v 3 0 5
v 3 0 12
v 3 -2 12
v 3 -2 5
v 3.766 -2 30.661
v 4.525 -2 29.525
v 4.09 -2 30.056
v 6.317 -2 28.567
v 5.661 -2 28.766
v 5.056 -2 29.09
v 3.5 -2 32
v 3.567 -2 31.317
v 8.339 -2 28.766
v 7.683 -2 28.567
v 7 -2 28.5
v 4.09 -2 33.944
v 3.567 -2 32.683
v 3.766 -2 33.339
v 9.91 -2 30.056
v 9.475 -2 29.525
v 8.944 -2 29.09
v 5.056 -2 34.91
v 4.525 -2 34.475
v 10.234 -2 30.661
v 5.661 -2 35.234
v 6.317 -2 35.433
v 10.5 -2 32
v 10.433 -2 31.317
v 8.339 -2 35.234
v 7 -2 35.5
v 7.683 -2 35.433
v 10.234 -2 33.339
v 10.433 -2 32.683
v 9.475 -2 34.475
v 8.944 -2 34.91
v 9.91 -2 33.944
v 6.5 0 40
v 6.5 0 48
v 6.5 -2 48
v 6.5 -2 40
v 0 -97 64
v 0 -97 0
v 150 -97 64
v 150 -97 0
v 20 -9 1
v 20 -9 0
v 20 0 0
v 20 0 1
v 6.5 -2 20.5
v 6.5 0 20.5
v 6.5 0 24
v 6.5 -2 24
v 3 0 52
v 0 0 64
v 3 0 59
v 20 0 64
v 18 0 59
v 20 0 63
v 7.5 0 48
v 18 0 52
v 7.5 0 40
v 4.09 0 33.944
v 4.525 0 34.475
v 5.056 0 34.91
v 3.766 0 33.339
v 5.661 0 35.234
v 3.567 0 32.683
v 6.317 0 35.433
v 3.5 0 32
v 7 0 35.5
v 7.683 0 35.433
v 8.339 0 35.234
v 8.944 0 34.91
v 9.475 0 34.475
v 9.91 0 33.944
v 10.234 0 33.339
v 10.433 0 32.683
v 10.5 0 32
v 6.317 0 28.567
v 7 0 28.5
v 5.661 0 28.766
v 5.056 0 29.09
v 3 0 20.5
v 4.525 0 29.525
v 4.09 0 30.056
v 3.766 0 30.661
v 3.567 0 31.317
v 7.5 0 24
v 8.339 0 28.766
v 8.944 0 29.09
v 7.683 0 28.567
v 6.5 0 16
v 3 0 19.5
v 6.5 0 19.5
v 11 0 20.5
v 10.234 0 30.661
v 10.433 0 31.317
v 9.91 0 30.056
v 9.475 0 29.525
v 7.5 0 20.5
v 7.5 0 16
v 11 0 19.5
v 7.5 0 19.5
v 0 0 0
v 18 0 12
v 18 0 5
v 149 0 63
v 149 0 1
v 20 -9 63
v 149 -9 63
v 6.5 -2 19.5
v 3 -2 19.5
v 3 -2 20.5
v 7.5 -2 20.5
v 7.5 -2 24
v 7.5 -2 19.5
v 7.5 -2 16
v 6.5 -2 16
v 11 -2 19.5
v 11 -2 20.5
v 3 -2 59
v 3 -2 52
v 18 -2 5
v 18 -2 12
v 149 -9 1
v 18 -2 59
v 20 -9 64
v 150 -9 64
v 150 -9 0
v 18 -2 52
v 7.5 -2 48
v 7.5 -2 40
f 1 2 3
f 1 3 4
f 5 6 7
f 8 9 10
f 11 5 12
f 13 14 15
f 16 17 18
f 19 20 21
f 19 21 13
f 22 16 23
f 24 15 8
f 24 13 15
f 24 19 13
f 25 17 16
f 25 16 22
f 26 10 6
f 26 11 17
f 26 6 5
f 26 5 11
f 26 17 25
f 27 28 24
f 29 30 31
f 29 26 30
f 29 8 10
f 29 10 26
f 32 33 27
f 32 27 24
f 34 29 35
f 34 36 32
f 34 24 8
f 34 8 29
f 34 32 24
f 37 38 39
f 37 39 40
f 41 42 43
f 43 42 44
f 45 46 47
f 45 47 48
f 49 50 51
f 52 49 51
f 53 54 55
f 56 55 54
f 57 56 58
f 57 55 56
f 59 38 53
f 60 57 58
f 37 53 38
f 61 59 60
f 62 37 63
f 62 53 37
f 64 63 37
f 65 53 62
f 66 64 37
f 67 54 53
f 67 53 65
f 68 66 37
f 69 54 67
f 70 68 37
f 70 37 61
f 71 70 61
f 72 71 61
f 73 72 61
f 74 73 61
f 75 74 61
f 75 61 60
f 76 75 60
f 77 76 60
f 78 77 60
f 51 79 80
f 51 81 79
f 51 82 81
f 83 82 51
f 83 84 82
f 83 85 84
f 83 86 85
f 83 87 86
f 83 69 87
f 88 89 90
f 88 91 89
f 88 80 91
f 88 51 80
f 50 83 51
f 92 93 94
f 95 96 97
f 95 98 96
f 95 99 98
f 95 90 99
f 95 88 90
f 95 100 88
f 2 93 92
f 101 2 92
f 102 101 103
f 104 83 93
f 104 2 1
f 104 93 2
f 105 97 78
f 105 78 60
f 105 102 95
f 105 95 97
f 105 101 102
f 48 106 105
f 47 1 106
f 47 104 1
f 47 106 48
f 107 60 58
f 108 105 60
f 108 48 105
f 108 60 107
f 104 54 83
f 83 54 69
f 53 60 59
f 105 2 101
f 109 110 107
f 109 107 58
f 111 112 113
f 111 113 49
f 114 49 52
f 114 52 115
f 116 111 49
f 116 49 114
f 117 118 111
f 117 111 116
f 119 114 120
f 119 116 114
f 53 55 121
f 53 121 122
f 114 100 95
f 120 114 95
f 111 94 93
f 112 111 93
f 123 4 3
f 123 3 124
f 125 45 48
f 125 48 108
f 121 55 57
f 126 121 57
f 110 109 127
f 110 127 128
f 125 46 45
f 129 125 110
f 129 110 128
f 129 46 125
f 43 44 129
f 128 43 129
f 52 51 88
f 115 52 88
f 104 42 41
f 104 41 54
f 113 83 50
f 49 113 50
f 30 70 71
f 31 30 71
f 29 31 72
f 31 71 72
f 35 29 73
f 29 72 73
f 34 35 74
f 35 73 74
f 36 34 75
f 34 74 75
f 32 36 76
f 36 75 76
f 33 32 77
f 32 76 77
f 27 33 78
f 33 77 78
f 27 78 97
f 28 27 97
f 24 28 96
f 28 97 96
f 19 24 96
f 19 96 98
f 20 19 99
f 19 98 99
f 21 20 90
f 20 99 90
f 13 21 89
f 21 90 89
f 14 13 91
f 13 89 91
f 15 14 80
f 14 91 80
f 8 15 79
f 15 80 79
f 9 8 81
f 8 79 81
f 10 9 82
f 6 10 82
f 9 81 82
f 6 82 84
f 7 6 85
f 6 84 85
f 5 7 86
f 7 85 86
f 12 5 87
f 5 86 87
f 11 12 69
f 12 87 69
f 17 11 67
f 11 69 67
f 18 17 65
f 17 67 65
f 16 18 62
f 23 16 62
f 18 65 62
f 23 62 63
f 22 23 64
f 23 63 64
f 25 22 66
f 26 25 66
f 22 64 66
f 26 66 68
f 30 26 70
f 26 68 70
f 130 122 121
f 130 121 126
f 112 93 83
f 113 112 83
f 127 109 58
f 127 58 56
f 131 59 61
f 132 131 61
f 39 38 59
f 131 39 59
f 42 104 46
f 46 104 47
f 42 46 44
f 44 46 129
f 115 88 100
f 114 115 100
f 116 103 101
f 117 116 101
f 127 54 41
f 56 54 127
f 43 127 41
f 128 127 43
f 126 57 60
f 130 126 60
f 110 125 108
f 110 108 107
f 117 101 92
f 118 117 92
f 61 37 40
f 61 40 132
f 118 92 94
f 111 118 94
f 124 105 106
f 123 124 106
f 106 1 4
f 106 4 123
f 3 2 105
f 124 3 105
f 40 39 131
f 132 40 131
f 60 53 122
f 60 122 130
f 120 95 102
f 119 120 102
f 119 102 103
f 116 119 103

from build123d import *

# Parameters (mm, degrees)
SKETCH1_W               = 150
SKETCH1_H               = 97
BOSS_EXTRUDE2_DEPTH     = 64
CUT_EXTRUDE1_DEPTH      = 190.74983531
CUT_EXTRUDE1_DEPTH_BACK = 9
SKETCH4_R               = 3.5
SKETCH4_W               = 15
SKETCH4_H               = 7
SKETCH4_W_2             = 1
SKETCH4_H_2             = 8
CUT_EXTRUDE2_DEPTH      = 2


with BuildPart() as part:
    # Sketch1 → Boss-Extrude2 (new body)
    with BuildSketch(Plane.XY):
        with Locations((75, -48.5)):
            Rectangle(SKETCH1_W, SKETCH1_H)
    extrude(amount=BOSS_EXTRUDE2_DEPTH)

    # Sketch3 → Cut-Extrude1 (cut, two sides: drawn at the far end of the back side and taken through both)
    with BuildSketch(Plane(origin=(0, 0, 0), x_dir=(1, 0, 0), z_dir=(0, 1, 0)).offset(-CUT_EXTRUDE1_DEPTH_BACK)):
        Polygon((20, 299.799930987), (20, 0), (20, -1), (149, -1), (149, -63), (20, -63), (20, -64), (20, -363.799930987), (619.599861974, -363.799930987), (619.599861974, 299.799930987), align=None)
    extrude(amount=CUT_EXTRUDE1_DEPTH + CUT_EXTRUDE1_DEPTH_BACK, mode=Mode.SUBTRACT)

    # Sketch4 → Cut-Extrude2 (cut)
    with BuildSketch(Plane(origin=(0, 0, 0), x_dir=(1, 0, 0), z_dir=(0, 1, 0))):
        with Locations(Location((7, -32, 0), (0, 0, 270))):
            Circle(SKETCH4_R)
        with Locations((10.5, -8.5)):
            Rectangle(SKETCH4_W, SKETCH4_H)
        with Locations((10.5, -55.5)):
            Rectangle(SKETCH4_W, SKETCH4_H)
        Polygon((6.5, -16), (6.5, -19.5), (3, -19.5), (3, -20.5), (6.5, -20.5), (6.5, -24), (7.5, -24), (7.5, -20.5), (11, -20.5), (11, -19.5), (7.5, -19.5), (7.5, -16), align=None)
        with Locations((7, -44)):
            Rectangle(SKETCH4_W_2, SKETCH4_H_2)
    extrude(amount=-CUT_EXTRUDE2_DEPTH, mode=Mode.SUBTRACT)


solid = part.part
